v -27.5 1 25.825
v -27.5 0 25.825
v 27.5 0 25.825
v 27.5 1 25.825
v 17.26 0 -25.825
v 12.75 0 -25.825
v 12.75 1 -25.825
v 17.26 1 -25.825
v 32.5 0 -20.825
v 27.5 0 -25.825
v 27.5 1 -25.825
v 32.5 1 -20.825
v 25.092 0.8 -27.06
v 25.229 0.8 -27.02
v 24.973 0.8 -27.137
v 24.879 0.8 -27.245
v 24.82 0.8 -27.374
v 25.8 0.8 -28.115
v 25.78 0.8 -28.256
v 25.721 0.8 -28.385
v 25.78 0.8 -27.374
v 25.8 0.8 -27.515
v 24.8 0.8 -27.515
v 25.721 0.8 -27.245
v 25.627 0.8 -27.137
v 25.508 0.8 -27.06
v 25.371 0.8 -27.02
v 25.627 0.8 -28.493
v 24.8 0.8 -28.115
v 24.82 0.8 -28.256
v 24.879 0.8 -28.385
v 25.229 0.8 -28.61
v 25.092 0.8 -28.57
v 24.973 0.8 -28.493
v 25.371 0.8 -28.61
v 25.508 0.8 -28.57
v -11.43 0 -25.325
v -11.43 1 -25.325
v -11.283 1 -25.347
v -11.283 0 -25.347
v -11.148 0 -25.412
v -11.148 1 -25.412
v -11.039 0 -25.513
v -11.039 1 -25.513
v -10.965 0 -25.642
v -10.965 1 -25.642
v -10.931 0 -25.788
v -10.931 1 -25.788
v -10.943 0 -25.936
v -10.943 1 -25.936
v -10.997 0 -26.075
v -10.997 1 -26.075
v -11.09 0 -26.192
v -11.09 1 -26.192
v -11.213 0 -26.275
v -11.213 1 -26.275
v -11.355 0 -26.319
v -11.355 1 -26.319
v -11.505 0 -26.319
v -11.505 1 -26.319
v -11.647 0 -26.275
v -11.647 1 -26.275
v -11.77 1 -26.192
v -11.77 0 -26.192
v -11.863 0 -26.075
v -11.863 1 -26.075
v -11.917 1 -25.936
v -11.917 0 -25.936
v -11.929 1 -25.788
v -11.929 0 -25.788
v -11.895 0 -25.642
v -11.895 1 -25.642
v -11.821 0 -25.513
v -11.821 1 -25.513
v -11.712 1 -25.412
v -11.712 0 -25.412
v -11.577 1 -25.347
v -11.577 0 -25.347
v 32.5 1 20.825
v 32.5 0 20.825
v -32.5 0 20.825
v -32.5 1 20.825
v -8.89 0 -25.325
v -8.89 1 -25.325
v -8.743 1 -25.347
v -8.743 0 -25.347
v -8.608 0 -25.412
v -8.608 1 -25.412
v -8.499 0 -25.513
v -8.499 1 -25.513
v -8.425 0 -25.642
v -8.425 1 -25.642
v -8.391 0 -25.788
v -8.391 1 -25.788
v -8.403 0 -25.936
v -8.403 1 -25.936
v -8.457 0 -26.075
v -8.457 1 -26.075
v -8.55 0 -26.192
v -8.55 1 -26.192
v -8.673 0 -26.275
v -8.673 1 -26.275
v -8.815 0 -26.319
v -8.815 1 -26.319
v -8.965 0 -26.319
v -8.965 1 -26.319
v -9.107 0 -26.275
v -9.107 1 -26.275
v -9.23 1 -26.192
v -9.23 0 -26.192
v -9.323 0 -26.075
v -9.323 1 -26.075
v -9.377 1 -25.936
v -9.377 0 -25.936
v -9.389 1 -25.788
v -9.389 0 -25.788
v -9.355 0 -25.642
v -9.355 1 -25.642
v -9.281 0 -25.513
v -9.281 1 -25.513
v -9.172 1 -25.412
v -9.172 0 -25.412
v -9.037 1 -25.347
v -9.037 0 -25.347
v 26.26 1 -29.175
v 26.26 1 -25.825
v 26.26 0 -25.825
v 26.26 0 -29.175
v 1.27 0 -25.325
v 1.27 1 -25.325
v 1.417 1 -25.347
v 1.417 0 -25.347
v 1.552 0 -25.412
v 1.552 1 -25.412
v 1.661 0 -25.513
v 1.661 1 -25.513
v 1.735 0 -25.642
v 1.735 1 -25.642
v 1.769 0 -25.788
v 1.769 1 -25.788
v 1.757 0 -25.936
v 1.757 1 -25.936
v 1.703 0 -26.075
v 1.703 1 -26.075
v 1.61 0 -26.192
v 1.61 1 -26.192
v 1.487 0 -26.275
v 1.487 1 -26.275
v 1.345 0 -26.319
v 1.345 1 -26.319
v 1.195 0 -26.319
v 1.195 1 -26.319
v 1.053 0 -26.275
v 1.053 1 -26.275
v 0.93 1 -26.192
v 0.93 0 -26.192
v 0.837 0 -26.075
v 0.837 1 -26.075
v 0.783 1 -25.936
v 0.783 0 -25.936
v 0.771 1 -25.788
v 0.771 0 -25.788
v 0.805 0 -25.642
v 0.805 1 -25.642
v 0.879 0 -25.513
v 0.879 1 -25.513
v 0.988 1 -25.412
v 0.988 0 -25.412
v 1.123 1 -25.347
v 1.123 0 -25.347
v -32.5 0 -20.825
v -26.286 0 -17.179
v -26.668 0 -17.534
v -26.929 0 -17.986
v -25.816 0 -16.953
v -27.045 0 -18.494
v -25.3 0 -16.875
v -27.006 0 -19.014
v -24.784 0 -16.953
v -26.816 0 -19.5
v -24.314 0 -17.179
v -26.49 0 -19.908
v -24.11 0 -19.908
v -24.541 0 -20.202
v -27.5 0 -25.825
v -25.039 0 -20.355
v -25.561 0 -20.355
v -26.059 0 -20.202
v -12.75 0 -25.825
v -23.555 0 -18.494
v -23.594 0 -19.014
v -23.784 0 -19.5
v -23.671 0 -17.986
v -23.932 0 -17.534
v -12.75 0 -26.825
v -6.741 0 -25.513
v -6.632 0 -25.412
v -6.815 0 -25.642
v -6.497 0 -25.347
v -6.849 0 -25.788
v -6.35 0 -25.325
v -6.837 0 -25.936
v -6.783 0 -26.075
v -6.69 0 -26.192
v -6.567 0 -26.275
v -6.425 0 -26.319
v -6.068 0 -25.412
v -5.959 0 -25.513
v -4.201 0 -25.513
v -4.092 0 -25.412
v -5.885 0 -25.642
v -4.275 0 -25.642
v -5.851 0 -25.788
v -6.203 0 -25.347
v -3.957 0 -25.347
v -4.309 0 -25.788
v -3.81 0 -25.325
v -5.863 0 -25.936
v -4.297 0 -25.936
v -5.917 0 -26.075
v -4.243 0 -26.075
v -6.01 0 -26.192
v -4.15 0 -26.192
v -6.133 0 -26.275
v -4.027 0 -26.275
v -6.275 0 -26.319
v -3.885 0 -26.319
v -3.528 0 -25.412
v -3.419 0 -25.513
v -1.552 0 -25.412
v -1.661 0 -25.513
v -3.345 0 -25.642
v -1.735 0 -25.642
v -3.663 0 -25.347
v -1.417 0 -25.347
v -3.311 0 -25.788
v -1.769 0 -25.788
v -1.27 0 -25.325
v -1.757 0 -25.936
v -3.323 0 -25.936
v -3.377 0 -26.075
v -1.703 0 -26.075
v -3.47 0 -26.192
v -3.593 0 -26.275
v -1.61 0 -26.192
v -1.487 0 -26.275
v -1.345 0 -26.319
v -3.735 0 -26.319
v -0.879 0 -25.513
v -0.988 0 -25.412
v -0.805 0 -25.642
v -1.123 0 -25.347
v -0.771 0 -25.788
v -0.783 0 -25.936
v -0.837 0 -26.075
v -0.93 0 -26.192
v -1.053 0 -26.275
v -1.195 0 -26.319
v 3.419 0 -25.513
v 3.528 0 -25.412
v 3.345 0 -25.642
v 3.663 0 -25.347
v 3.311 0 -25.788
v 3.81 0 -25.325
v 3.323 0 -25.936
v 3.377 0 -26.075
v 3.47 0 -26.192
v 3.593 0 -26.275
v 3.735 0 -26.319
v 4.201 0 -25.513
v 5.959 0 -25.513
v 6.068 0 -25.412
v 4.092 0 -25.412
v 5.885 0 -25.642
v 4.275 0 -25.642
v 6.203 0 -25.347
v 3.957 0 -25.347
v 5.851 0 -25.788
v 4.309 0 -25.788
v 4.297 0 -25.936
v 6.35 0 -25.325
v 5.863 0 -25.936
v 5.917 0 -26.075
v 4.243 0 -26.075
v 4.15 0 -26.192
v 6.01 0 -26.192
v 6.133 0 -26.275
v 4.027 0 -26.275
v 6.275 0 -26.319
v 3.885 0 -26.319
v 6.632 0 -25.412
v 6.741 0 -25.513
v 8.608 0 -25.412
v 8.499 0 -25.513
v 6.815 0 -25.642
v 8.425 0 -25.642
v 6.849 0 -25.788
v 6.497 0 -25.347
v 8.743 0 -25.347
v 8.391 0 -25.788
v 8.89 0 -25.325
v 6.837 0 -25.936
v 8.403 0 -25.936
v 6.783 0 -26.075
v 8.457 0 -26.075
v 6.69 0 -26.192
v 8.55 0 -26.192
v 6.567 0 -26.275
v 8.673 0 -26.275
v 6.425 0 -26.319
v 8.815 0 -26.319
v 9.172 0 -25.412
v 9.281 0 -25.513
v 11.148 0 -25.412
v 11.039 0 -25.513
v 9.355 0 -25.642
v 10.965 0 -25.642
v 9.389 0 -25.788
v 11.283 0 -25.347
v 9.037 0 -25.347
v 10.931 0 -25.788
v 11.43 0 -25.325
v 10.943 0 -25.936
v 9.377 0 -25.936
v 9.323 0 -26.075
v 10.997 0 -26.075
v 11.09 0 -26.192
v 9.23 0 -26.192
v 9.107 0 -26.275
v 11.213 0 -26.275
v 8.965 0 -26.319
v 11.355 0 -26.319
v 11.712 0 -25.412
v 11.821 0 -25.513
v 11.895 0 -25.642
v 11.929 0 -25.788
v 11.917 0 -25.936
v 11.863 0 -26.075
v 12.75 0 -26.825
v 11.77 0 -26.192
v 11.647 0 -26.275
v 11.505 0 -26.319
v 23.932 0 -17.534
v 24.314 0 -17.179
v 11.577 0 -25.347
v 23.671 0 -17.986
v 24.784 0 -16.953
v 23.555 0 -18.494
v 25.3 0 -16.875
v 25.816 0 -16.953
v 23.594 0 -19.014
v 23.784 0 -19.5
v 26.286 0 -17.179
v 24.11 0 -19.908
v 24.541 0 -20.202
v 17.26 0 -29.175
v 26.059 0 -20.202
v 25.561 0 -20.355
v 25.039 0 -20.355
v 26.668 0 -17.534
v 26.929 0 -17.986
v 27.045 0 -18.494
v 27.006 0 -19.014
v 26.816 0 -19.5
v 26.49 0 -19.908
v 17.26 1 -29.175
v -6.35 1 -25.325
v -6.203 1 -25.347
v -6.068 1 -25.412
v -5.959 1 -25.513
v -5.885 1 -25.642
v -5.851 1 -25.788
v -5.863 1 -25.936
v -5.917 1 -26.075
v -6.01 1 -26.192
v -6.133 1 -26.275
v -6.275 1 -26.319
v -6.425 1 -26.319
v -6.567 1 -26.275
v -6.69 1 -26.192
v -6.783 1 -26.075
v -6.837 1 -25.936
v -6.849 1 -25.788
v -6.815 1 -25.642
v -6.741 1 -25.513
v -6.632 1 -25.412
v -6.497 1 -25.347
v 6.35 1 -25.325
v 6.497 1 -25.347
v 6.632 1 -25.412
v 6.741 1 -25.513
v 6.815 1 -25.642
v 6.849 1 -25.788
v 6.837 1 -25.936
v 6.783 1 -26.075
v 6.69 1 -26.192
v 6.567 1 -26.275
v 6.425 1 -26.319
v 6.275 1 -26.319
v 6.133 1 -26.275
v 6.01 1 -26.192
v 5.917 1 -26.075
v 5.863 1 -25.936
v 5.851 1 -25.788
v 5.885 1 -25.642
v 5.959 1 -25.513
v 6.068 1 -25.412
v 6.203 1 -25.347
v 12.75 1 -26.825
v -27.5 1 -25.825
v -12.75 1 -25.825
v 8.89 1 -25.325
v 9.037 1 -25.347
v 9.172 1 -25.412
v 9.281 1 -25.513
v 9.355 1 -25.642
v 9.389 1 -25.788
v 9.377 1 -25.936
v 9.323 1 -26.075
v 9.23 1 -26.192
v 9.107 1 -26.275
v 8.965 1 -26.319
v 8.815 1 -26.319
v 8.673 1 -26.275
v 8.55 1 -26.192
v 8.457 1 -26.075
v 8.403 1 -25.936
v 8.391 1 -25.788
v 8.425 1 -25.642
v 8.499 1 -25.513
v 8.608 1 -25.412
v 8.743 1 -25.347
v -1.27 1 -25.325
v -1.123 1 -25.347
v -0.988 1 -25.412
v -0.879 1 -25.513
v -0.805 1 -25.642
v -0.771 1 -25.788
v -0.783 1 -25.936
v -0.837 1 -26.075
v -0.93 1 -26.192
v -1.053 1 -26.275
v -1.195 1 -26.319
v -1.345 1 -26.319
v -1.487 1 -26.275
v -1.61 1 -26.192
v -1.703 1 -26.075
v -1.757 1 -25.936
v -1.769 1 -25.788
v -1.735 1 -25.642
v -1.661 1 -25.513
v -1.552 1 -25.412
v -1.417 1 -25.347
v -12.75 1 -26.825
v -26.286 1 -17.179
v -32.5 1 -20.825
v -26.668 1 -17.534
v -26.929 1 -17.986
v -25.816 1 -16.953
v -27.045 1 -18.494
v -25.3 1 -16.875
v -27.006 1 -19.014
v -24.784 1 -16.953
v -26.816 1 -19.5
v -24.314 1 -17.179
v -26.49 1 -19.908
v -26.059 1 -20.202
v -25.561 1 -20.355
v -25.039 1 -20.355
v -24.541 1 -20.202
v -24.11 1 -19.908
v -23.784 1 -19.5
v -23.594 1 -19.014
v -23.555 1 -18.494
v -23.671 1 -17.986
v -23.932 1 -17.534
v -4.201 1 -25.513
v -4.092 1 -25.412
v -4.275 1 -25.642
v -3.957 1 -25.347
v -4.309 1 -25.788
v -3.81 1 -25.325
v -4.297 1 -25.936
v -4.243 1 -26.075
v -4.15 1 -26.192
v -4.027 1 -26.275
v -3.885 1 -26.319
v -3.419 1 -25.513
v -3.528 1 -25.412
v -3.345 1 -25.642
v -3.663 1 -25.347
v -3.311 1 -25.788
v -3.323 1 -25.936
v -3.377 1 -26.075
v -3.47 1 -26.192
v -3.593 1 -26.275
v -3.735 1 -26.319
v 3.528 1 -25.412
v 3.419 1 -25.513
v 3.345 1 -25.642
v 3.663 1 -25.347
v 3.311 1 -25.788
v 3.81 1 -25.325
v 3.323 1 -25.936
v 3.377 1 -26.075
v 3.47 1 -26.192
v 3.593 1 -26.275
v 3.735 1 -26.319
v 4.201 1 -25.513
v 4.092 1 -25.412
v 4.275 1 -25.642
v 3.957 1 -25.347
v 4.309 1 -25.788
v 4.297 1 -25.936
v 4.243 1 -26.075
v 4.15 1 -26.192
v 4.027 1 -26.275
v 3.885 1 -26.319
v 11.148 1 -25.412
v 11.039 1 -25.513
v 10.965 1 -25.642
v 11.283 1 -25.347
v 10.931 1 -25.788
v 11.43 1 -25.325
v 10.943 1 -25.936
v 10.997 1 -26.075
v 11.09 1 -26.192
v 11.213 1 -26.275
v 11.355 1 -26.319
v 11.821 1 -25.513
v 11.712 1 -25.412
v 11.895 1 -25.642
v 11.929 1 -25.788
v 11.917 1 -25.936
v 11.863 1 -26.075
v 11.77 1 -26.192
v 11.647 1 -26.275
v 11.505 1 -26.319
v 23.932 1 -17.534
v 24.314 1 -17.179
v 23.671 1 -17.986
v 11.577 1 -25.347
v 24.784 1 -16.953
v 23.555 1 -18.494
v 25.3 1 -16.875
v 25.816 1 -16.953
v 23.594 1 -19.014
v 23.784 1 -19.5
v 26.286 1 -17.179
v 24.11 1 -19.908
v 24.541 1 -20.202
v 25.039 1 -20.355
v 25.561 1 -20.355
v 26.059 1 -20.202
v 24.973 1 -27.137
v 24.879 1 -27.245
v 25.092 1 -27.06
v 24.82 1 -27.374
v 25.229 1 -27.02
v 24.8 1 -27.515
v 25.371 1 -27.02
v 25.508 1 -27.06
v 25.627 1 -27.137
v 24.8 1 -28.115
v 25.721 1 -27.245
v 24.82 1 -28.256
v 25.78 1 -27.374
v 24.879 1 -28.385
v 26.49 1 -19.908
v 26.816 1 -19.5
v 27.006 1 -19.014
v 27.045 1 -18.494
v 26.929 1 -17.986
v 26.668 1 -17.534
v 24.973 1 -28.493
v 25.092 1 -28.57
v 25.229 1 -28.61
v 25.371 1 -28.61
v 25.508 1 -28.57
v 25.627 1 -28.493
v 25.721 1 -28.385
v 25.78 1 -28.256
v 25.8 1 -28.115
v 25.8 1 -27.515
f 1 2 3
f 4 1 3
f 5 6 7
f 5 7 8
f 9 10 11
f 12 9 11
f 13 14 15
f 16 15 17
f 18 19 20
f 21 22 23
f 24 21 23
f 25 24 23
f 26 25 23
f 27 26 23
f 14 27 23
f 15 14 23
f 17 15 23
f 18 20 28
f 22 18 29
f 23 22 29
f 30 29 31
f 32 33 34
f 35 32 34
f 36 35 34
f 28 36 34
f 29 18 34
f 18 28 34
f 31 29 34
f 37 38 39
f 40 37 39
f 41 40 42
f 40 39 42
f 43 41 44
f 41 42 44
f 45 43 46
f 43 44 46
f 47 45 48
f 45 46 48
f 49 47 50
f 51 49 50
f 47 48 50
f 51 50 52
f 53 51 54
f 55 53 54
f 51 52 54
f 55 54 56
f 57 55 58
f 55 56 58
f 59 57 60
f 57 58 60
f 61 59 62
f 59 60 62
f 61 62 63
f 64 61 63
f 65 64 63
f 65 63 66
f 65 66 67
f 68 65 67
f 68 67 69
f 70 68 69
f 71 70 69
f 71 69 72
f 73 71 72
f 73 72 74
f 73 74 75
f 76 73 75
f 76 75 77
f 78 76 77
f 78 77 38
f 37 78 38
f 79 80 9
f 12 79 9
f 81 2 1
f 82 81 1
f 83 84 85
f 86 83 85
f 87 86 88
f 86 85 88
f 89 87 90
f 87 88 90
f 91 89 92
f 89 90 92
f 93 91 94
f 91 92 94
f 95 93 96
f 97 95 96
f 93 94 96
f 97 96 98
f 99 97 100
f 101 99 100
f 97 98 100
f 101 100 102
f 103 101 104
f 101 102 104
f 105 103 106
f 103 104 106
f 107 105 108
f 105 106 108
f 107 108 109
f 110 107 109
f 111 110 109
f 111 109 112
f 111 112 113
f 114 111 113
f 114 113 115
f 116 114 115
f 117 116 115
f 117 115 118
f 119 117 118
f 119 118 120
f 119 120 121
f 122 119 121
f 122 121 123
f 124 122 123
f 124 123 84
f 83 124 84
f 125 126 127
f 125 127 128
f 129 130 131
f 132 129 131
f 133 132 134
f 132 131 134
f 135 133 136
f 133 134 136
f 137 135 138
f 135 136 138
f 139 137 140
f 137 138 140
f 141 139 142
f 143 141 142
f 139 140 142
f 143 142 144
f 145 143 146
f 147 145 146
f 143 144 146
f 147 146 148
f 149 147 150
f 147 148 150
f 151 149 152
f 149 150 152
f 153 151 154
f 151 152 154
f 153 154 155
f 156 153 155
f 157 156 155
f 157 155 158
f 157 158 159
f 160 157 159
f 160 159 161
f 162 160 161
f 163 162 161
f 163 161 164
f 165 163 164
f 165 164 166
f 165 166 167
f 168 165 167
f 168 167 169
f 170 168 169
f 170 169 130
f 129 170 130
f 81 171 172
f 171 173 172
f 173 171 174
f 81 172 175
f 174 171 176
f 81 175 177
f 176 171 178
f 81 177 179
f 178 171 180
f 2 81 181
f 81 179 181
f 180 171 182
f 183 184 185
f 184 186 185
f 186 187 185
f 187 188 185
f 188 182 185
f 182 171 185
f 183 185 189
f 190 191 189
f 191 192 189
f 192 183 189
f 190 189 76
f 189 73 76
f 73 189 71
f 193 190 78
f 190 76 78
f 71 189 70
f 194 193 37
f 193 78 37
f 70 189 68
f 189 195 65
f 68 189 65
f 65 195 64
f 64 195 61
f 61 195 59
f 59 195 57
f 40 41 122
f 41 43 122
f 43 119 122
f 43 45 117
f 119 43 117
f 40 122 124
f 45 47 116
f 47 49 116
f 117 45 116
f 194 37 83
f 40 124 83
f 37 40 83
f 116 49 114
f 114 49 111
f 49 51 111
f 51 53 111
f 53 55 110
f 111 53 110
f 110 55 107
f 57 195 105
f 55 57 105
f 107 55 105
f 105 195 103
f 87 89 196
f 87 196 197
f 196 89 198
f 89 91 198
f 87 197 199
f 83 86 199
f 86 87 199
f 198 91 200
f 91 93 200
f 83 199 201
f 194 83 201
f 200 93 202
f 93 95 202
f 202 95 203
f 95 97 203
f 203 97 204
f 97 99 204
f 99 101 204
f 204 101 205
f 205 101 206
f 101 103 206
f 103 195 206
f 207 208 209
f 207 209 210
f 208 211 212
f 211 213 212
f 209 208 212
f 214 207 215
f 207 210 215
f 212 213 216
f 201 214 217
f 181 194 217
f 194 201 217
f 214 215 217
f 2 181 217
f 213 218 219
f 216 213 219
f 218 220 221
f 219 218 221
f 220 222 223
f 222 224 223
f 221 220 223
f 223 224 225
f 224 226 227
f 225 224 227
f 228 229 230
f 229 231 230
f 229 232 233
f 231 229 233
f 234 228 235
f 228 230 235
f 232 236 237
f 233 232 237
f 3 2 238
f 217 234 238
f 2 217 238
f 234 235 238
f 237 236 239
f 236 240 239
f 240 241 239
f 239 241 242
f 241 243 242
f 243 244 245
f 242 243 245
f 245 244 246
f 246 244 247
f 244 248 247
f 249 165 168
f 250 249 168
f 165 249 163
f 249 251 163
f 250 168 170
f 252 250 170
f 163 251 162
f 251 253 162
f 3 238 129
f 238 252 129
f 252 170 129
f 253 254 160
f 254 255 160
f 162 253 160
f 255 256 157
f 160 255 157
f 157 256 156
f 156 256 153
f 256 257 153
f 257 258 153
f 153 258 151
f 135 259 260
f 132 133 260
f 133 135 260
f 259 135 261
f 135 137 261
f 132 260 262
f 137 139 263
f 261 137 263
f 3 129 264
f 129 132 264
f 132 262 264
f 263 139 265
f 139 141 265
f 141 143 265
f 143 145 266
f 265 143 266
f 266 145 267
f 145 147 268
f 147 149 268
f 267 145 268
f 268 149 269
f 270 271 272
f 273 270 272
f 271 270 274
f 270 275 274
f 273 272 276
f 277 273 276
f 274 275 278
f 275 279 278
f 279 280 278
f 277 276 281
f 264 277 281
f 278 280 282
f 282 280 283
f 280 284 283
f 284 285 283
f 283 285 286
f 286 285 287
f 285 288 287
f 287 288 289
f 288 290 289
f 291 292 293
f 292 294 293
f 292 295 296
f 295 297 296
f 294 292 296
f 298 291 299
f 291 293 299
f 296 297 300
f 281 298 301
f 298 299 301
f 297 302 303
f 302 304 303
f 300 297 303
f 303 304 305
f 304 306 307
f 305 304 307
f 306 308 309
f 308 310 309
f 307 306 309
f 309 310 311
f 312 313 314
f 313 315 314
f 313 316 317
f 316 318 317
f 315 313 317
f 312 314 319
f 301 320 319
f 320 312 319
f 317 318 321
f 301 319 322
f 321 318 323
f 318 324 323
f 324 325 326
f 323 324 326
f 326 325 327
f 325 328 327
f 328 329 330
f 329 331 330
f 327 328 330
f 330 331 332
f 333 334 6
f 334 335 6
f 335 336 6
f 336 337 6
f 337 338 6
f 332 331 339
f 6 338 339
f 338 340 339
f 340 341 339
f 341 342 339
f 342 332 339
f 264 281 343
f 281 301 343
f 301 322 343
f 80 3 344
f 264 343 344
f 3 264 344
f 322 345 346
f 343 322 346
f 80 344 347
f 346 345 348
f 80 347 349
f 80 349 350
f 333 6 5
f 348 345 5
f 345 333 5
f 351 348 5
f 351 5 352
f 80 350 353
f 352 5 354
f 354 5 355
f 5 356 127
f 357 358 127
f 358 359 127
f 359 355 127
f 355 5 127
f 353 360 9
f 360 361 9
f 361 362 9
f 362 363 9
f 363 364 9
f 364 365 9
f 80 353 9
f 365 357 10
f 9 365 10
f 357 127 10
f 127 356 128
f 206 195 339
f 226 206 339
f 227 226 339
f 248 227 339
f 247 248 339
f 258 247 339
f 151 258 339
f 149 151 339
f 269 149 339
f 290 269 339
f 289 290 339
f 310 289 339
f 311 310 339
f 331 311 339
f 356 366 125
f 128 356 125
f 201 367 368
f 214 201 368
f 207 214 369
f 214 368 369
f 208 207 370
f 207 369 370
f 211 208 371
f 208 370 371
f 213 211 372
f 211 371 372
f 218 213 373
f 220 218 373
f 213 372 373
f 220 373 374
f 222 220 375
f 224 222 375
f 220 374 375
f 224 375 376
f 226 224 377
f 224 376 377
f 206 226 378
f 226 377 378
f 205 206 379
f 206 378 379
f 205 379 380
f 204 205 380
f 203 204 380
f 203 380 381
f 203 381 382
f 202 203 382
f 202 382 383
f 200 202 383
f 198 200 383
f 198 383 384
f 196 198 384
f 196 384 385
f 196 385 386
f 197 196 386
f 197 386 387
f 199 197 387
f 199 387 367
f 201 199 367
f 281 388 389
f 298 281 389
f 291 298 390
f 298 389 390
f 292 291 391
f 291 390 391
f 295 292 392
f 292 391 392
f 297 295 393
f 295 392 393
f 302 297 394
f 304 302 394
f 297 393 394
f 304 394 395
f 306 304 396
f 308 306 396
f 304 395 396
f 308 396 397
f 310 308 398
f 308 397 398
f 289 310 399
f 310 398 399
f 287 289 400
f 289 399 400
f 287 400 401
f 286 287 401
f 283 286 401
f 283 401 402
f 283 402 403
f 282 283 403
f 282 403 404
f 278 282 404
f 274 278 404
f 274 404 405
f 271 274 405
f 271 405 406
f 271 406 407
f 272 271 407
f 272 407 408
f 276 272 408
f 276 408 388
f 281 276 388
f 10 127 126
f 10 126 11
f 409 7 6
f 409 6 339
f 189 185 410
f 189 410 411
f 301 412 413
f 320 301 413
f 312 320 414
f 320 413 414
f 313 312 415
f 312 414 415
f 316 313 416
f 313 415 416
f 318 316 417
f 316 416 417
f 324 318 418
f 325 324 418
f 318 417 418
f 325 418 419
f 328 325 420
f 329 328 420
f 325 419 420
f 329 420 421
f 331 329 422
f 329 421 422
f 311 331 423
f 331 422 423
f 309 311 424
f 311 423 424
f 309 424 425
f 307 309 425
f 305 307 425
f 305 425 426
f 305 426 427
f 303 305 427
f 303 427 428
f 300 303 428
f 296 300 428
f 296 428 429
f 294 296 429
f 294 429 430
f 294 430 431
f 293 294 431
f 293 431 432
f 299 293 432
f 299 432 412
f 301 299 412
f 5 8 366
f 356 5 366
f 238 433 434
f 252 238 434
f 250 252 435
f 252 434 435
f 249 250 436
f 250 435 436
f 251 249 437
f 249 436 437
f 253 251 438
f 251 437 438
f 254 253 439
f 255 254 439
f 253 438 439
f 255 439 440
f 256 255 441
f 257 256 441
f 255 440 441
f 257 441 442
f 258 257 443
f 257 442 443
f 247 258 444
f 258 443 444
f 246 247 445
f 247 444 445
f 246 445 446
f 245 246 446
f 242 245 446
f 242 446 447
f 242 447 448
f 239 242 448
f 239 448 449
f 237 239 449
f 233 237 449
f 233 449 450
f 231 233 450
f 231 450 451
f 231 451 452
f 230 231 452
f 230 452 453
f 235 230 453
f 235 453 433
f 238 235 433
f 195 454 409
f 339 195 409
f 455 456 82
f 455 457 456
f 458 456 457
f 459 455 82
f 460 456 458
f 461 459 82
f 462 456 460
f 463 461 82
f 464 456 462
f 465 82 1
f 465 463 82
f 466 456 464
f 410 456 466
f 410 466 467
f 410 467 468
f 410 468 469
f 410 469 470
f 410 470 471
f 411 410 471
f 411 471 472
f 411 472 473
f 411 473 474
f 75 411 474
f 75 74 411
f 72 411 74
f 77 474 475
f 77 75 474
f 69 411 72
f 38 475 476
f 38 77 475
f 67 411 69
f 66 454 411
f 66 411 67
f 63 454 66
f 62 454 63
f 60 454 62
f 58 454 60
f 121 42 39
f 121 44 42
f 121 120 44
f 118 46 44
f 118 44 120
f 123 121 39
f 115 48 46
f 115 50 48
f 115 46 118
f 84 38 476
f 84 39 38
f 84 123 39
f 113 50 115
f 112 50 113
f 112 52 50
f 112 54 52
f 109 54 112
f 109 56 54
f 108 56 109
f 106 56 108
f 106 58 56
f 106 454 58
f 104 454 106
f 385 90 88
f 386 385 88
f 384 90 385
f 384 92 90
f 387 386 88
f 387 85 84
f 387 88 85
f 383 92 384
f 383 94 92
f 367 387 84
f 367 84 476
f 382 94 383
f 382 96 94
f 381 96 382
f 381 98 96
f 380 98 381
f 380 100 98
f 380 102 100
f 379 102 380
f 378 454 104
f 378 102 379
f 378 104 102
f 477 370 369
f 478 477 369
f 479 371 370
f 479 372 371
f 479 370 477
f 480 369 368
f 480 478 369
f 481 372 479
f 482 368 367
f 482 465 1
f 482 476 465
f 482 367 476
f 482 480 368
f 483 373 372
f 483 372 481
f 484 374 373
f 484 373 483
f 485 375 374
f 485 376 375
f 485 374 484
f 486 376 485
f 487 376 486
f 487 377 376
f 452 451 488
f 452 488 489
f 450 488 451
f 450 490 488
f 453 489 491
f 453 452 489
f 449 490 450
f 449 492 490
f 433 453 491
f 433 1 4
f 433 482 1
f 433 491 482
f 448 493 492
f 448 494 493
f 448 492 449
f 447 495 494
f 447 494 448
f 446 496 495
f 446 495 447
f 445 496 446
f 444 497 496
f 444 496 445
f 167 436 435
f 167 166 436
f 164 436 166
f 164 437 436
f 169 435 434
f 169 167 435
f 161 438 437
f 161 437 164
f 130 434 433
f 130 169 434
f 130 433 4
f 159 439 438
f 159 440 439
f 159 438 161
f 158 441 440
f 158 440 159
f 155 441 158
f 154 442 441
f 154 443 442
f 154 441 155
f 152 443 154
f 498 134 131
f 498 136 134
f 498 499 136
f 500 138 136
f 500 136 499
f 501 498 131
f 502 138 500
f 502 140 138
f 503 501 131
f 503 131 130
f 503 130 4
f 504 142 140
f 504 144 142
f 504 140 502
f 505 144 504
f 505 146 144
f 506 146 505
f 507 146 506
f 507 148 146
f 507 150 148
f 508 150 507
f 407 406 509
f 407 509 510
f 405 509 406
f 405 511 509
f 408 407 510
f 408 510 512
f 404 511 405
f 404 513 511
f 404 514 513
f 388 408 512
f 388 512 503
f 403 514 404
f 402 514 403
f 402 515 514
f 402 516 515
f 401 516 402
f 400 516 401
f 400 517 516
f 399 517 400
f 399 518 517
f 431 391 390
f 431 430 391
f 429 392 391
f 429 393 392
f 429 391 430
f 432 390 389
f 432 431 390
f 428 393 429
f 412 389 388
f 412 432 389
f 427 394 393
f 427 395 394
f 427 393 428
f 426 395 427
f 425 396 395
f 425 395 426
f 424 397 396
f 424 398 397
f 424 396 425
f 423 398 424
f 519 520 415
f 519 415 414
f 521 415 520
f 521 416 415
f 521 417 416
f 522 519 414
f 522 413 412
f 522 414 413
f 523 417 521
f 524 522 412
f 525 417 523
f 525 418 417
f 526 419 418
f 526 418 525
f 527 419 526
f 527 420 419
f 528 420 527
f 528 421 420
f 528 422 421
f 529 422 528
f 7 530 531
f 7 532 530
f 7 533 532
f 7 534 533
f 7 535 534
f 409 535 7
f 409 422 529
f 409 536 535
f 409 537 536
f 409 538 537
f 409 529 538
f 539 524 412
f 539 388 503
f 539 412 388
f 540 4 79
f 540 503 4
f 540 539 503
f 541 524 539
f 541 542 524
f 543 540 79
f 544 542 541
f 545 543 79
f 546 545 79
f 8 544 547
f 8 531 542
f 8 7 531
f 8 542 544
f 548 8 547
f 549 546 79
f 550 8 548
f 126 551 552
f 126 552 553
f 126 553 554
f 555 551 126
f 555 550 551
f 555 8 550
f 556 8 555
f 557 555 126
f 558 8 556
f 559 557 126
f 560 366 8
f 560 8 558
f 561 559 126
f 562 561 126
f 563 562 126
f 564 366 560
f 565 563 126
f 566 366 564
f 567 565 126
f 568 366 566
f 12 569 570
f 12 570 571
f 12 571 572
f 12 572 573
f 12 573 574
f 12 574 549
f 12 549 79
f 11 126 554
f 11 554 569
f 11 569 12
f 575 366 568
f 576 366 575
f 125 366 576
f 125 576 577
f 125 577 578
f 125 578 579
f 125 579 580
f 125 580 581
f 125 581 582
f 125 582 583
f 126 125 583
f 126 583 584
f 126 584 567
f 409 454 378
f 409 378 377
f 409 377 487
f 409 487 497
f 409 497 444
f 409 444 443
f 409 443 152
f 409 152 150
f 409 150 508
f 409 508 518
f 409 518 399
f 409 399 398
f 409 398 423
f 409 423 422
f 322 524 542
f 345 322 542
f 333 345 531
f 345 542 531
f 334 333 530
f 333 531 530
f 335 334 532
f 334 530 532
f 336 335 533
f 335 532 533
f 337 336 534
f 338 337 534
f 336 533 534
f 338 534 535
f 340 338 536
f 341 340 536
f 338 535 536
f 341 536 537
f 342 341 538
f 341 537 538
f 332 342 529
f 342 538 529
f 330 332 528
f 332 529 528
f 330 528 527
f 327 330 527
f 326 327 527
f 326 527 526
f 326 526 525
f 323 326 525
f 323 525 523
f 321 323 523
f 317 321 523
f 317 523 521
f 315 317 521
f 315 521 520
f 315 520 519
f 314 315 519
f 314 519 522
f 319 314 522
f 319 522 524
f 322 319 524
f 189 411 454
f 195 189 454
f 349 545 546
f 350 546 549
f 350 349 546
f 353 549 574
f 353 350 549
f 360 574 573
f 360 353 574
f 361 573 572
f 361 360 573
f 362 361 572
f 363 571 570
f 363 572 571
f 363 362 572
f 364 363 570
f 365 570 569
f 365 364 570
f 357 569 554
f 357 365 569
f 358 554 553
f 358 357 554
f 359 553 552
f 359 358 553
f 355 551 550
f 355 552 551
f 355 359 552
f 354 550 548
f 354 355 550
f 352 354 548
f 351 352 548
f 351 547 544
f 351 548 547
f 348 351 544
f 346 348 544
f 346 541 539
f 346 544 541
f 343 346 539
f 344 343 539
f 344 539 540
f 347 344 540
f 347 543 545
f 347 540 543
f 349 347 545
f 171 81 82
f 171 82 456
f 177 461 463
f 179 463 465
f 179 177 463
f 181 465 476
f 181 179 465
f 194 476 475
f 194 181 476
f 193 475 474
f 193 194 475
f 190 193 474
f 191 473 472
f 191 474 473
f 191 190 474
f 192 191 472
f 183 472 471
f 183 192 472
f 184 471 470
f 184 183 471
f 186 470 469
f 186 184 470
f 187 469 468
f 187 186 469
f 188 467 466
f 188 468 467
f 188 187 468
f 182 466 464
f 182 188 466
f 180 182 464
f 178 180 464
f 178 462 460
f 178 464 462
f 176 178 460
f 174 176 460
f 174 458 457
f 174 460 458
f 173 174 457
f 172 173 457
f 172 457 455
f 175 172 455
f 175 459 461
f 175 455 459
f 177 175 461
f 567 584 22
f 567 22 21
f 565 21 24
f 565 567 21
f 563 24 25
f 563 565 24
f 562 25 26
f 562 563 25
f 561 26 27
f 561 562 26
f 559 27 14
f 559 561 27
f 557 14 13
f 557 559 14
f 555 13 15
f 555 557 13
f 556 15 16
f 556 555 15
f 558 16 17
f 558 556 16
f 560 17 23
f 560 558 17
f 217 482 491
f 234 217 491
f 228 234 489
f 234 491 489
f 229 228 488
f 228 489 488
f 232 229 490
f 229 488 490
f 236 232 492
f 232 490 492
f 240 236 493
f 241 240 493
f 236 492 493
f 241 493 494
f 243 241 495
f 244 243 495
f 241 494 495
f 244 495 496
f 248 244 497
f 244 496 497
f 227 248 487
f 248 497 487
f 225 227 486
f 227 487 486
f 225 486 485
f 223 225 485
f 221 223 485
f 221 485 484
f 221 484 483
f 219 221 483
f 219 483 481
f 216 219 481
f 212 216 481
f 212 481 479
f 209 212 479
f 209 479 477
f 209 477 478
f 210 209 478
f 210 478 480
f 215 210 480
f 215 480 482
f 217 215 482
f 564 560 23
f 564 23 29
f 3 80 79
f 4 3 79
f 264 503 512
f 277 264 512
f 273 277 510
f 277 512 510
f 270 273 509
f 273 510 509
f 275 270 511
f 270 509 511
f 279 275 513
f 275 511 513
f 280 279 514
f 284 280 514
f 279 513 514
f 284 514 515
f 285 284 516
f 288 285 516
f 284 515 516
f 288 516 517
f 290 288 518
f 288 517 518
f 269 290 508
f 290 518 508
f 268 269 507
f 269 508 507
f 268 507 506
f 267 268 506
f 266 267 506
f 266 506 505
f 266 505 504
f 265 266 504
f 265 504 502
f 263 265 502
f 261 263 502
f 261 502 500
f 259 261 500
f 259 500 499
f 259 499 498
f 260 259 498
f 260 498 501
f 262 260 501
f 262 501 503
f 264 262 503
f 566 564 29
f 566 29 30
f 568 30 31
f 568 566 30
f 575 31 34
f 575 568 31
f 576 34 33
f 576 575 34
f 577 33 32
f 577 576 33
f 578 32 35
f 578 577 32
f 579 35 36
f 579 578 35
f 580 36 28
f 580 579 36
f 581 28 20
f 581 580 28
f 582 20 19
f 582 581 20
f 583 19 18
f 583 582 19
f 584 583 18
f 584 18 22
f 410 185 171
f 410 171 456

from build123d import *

# Parameters (mm, degrees)
SKETCH1_W           = 65
SKETCH1_H           = 51.65
BOSS_EXTRUDE1_DEPTH = 1
CHAMFER1_SIZE       = 5
CUT_EXTRUDE2_REACH  = 43.523
SKETCH2_R           = 1.75
SKETCH3_W           = 25.5
SKETCH3_H           = 1
BOSS_EXTRUDE3_DEPTH = 1
CUT_EXTRUDE3_REACH  = 44.152
SKETCH4_R           = 0.5
LPATTERN1_COUNT     = 6
LPATTERN1_PITCH     = 2.54
LPATTERN1_COL_COUNT = 5
LPATTERN1_COL_PITCH = 2.54
SKETCH5_W           = 9
SKETCH5_H           = 3.35
BOSS_EXTRUDE4_DEPTH = 1
CUT_EXTRUDE4_DEPTH  = 0.2


with BuildPart() as part:
    # Sketch1 → Boss-Extrude1 (new body)
    with BuildSketch(Plane(origin=(0, 0, 0), x_dir=(1, 0, 0), z_dir=(0, 1, 0))):
        Rectangle(SKETCH1_W, SKETCH1_H)
    extrude(amount=BOSS_EXTRUDE1_DEPTH)

    # Chamfer1
    chamfer1_edges = [part.edges().sort_by_distance(p)[0] for p in [
        (-32.5, 0.5, -25.825),
        (32.5, 0.5, -25.825),
        (32.5, 0.5, 25.825),
        (-32.5, 0.5, 25.825),
    ]]
    chamfer(chamfer1_edges, length=CHAMFER1_SIZE)

    # Sketch2 → Cut-Extrude2 (cut, up to next)
    with BuildSketch(Plane(origin=(0, 0, 0), x_dir=(1, 0, 0), z_dir=(0, 1, 0)), mode=Mode.PRIVATE) as cut_extrude2_sk1:
        with Locations(Location((-25.3, 18.625, 0), (0, 0, 270))):
            Circle(SKETCH2_R)
    cut_extrude2_tool1 = extrude(cut_extrude2_sk1.sketch, amount=CUT_EXTRUDE2_REACH, mode=Mode.PRIVATE) & part.part
    # Sketch2 → Cut-Extrude2 (cut, up to next)
    with BuildSketch(Plane(origin=(0, 0, 0), x_dir=(1, 0, 0), z_dir=(0, 1, 0)), mode=Mode.PRIVATE) as cut_extrude2_sk2:
        with Locations(Location((25.3, 18.625, 0), (0, 0, 270))):
            Circle(SKETCH2_R)
    cut_extrude2_tool2 = extrude(cut_extrude2_sk2.sketch, amount=CUT_EXTRUDE2_REACH, mode=Mode.PRIVATE) & part.part
    add(cut_extrude2_tool1.solids().sort_by_distance((-25.3, 0, -18.625))[0], mode=Mode.SUBTRACT)
    add(cut_extrude2_tool2.solids().sort_by_distance((25.3, 0, -18.625))[0], mode=Mode.SUBTRACT)

    # Sketch3 → Boss-Extrude3 (add)
    with BuildSketch(Plane(origin=(0, 1, 0), x_dir=(1, 0, 0), z_dir=(0, 1, 0))):
        with Locations((0, 26.325)):
            Rectangle(SKETCH3_W, SKETCH3_H)
    extrude(amount=-BOSS_EXTRUDE3_DEPTH)

    # Sketch4 → Cut-Extrude3 (cut, up to next)
    with BuildSketch(Plane(origin=(0, 1, 0), x_dir=(1, 0, 0), z_dir=(0, 1, 0)), mode=Mode.PRIVATE) as cut_extrude3_sk1:
        with Locations(Location((-1.27, 25.825, 0), (0, 0, 270))):
            Circle(SKETCH4_R)
    cut_extrude3_tool1 = extrude(cut_extrude3_sk1.sketch, amount=-CUT_EXTRUDE3_REACH, mode=Mode.PRIVATE) & part.part
    cut_extrude3 = cut_extrude3_tool1.solids().sort_by_distance((-1.27, 1, -25.825))[0]
    add(cut_extrude3, mode=Mode.SUBTRACT)

    # LPattern1: Cut-Extrude3 ×6
    with Locations(*[(i * LPATTERN1_PITCH, 0, 0) for i in range(1, LPATTERN1_COUNT)]):
        add(cut_extrude3, mode=Mode.SUBTRACT)

    # LPattern1 col: Cut-Extrude3 ×5
    with Locations(*[(-i * LPATTERN1_COL_PITCH, 0, 0) for i in range(1, LPATTERN1_COL_COUNT)]):
        add(cut_extrude3, mode=Mode.SUBTRACT)

    # Sketch5 → Boss-Extrude4 (add)
    with BuildSketch(Plane(origin=(0, 1, 0), x_dir=(1, 0, 0), z_dir=(0, 1, 0))):
        with Locations((21.76, 27.5)):
            Rectangle(SKETCH5_W, SKETCH5_H)
    extrude(amount=-BOSS_EXTRUDE4_DEPTH)

    # Sketch6 → Cut-Extrude4 (cut)
    with BuildSketch(Plane(origin=(0, 1, 0), x_dir=(1, 0, 0), z_dir=(0, 1, 0))):
        with BuildLine():
            Line((25.8, 28.115), (25.8, 27.515))
            ThreePointArc((25.8, 27.515), (25.3, 27.015), (24.8, 27.515))
            Line((24.8, 27.515), (24.8, 28.115))
            ThreePointArc((24.8, 28.115), (25.3, 28.615), (25.8, 28.115))
        make_face()
    extrude(amount=-CUT_EXTRUDE4_DEPTH, mode=Mode.SUBTRACT)


solid = part.part
